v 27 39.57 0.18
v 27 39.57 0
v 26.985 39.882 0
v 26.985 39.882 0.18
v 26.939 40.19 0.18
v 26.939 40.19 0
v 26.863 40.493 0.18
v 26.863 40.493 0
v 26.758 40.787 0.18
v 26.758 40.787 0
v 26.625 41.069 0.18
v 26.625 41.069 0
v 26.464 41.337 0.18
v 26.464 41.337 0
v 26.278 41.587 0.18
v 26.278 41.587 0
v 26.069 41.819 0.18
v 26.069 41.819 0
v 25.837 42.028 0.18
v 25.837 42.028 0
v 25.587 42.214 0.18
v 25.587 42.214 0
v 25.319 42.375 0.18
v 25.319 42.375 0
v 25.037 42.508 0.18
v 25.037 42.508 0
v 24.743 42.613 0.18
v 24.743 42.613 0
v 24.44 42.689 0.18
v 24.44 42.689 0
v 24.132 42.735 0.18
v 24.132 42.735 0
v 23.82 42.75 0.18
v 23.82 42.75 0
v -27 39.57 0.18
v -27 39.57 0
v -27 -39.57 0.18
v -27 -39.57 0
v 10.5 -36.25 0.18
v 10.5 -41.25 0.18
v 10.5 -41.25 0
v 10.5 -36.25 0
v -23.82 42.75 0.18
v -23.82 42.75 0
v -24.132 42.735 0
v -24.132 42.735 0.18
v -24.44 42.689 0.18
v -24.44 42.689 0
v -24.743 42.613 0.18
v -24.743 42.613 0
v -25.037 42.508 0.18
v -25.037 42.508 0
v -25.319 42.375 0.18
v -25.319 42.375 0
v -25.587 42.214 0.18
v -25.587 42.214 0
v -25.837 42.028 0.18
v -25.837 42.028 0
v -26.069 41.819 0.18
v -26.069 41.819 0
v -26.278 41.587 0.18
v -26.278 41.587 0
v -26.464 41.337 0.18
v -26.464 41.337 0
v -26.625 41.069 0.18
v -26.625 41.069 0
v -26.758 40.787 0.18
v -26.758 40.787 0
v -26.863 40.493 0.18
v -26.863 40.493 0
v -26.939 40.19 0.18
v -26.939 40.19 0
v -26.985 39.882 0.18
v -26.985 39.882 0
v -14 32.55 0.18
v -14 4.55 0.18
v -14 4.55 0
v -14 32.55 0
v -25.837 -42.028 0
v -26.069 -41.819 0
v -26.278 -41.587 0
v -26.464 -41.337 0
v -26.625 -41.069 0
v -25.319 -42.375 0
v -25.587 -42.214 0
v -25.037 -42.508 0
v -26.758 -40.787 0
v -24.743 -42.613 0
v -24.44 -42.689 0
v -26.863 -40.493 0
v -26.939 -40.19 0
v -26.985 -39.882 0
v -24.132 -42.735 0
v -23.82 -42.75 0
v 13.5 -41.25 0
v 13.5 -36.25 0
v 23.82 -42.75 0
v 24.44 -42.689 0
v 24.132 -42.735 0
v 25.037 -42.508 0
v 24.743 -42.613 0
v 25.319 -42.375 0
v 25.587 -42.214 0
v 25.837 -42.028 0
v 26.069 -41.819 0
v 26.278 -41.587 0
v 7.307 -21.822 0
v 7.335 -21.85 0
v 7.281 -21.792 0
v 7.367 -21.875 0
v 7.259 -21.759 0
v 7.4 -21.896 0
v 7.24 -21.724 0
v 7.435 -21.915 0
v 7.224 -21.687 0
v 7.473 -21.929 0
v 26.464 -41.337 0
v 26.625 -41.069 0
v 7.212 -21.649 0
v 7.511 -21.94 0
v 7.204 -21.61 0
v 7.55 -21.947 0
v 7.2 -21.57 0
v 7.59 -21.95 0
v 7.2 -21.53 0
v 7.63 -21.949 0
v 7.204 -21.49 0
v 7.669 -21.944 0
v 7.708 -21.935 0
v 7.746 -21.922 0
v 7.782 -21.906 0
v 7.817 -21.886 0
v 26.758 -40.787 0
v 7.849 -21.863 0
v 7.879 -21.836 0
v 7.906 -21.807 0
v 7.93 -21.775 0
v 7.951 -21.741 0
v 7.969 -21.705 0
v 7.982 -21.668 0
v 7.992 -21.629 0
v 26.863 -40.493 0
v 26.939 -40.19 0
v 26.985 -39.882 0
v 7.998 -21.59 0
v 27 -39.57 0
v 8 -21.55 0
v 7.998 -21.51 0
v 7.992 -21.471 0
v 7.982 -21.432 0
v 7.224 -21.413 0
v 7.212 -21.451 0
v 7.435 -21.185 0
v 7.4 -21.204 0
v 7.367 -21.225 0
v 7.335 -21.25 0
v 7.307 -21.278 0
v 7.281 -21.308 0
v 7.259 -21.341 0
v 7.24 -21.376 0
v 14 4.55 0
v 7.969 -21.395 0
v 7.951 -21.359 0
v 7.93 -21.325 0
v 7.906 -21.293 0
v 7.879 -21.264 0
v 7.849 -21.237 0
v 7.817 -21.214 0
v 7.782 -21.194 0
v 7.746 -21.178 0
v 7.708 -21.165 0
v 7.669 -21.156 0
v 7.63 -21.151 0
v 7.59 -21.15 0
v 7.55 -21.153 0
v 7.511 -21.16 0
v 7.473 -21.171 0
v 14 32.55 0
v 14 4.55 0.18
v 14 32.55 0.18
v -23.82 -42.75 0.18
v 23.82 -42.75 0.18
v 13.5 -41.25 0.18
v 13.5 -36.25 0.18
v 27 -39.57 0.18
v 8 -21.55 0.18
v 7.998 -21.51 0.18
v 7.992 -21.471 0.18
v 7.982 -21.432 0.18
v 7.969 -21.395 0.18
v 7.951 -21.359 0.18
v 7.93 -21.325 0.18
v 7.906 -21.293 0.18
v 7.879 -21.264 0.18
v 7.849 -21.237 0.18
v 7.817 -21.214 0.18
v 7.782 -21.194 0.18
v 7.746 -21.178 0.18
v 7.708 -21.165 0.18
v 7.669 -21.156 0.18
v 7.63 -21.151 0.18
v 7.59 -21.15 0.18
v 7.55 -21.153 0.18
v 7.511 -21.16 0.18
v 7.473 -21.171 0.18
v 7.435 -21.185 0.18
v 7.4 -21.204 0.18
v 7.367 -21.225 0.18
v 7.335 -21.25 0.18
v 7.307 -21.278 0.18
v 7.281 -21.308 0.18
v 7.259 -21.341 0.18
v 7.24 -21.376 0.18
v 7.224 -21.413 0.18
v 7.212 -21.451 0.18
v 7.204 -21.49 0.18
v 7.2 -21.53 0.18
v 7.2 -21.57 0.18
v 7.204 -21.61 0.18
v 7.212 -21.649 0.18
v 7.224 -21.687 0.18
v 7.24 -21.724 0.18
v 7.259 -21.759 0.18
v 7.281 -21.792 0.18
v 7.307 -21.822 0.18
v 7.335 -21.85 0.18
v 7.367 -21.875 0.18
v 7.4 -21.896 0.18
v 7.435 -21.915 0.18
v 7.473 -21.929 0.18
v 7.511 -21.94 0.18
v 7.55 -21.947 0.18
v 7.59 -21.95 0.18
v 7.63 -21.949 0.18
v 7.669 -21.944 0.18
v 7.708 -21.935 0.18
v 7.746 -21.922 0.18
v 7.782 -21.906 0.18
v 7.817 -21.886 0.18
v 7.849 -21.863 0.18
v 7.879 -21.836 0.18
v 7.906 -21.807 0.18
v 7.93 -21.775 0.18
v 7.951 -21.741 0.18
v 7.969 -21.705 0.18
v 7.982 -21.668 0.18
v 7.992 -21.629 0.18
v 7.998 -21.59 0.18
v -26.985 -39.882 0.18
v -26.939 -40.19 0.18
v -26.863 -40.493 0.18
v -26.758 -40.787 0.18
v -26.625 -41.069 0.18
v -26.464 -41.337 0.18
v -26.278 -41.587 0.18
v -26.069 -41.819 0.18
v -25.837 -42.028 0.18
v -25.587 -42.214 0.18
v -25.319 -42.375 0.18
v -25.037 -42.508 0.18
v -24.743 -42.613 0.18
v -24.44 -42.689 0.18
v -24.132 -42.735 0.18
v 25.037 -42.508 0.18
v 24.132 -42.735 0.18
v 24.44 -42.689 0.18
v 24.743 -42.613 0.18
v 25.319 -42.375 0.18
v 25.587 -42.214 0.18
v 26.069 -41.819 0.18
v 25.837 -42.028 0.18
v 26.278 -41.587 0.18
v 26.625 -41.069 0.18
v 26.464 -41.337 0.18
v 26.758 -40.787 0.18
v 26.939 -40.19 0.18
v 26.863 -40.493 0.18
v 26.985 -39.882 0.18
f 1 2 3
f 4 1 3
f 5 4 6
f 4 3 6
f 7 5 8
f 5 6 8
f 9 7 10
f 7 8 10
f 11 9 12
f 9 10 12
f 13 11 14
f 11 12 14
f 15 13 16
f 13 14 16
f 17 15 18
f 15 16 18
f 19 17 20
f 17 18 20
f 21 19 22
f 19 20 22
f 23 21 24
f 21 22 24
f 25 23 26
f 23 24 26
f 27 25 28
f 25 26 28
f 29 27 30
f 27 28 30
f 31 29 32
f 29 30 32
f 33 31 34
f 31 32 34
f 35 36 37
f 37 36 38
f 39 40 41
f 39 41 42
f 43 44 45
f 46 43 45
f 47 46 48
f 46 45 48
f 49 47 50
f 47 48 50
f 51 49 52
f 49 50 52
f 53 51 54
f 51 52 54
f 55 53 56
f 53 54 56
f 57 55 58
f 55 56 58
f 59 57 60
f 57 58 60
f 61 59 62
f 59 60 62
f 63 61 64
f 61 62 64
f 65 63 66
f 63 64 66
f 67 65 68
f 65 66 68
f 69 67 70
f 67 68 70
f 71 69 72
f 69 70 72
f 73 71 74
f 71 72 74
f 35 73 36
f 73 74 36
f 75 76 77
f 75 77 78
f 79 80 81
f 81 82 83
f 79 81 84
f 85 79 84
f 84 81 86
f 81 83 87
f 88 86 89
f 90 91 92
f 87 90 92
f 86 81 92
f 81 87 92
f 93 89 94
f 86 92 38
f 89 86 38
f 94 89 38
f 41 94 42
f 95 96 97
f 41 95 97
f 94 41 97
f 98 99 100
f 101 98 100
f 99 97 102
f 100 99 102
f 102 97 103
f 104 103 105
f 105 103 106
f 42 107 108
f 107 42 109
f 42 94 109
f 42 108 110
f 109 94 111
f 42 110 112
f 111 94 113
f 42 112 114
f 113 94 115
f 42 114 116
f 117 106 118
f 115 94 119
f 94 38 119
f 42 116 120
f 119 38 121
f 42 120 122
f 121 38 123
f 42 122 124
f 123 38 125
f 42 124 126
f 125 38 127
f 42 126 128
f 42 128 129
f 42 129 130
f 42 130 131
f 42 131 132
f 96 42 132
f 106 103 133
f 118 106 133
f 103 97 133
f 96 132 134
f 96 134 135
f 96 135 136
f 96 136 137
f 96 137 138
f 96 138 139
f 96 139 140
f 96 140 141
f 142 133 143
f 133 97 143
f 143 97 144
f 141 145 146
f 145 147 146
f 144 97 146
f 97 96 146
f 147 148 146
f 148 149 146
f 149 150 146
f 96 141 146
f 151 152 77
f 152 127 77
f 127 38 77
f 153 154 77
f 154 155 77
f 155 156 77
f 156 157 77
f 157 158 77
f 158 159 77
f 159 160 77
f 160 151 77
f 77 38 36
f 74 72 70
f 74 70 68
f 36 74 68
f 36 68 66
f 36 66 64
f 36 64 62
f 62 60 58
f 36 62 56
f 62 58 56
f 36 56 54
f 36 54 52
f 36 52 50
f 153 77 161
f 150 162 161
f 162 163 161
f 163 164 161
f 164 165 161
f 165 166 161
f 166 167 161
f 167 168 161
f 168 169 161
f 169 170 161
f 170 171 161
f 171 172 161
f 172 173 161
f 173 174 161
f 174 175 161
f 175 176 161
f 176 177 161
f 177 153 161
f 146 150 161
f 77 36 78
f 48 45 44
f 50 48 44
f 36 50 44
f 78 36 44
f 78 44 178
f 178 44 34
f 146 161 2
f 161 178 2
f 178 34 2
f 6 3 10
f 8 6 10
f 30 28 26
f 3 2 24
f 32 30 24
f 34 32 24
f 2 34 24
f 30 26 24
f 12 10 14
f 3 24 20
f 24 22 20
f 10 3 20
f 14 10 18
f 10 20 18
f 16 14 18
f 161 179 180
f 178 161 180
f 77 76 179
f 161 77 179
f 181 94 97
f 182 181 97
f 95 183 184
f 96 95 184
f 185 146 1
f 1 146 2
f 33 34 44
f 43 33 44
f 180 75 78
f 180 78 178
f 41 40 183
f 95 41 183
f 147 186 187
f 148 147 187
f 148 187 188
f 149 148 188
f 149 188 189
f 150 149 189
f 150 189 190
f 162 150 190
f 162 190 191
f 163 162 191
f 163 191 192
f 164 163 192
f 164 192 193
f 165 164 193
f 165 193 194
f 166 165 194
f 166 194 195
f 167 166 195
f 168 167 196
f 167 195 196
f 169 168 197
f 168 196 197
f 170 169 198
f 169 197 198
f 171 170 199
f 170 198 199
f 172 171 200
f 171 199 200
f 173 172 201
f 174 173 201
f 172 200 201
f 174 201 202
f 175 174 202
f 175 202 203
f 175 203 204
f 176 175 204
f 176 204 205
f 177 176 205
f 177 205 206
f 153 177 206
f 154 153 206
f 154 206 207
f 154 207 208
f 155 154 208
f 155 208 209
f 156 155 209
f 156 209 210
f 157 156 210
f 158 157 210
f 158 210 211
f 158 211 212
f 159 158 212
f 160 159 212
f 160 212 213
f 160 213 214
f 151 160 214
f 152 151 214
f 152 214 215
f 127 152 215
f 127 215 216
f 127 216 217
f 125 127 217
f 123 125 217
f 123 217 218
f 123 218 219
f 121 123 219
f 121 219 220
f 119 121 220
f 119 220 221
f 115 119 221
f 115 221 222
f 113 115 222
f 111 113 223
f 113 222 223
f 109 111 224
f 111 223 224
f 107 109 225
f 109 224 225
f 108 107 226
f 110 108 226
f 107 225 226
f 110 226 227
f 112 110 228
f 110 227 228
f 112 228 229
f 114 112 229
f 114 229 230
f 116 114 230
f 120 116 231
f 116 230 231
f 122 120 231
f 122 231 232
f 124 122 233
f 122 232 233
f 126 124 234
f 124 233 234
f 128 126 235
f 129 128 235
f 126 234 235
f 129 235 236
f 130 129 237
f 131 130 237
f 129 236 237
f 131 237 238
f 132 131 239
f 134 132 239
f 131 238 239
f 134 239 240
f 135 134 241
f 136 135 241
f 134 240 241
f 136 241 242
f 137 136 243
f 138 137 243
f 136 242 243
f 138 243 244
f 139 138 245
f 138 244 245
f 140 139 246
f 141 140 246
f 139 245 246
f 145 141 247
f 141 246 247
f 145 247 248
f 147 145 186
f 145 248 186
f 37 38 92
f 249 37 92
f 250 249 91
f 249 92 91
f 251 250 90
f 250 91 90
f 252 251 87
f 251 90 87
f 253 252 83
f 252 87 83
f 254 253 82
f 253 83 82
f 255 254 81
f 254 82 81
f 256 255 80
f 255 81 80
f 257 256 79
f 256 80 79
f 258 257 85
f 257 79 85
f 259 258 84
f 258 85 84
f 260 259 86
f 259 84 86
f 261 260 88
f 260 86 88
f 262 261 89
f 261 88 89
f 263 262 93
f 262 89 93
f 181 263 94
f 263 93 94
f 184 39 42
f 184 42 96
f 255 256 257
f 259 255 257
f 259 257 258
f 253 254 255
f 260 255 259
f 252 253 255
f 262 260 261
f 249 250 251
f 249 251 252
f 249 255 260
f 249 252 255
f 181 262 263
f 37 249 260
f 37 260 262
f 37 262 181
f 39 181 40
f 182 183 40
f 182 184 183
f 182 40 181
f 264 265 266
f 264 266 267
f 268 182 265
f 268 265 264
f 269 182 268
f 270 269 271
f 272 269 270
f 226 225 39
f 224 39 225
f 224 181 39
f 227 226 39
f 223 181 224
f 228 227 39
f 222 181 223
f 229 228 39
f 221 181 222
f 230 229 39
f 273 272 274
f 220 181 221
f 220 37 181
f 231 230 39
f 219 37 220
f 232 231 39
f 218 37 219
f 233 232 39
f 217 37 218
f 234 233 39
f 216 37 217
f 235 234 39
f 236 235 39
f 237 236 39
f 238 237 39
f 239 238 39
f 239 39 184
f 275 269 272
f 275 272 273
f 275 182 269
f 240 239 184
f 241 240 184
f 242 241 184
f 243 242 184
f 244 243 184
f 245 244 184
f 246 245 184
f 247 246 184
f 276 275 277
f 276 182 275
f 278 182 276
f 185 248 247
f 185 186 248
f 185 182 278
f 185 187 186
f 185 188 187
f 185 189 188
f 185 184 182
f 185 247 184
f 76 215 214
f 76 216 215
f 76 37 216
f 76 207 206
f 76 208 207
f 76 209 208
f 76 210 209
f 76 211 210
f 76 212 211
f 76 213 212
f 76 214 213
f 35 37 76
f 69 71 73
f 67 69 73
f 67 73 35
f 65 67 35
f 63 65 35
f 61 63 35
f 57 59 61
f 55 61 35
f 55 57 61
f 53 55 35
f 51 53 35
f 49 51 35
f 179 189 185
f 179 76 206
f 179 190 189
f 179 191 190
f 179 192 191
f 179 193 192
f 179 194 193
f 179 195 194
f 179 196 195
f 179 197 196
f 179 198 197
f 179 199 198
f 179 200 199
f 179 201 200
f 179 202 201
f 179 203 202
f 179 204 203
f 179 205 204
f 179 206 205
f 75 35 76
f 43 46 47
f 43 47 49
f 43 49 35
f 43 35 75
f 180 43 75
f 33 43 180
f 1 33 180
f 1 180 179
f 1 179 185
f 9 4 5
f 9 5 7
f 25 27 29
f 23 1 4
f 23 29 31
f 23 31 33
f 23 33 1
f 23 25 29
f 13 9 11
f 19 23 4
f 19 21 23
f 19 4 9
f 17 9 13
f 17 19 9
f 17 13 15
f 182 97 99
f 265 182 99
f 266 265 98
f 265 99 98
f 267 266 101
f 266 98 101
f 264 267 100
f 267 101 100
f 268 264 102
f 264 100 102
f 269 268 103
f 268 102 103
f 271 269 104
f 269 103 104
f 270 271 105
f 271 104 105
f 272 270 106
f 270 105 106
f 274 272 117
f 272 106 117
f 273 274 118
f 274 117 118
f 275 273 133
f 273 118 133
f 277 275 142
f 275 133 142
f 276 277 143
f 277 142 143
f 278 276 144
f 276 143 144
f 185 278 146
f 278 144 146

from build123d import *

# Parameters (mm, degrees)
EXTRUDE_1_DEPTH     = 0.18
CUT_EXTRUDE_1_REACH = 52.563
SKETCH_2_R          = 0.4
SKETCH_2_W          = 3
SKETCH_2_H          = 5
SKETCH_3_W          = 28
SKETCH_3_H          = 28
CUT_EXTRUDE_2_DEPTH = 0.18


with BuildPart() as part:
    # 草图1 → 凸台-拉伸1 (new body)
    with BuildSketch(Plane.XY):
        with BuildLine():
            Line((-23.82, -42.75), (23.82, -42.75))
            ThreePointArc((23.82, -42.75), (26.068599564, -41.818599564), (27, -39.57))
            Line((27, -39.57), (27, 39.57))
            ThreePointArc((27, 39.57), (26.068599564, 41.818599564), (23.82, 42.75))
            Line((23.82, 42.75), (-23.82, 42.75))
            ThreePointArc((-23.82, 42.75), (-26.068599564, 41.818599564), (-27, 39.57))
            Line((-27, 39.57), (-27, -39.57))
            ThreePointArc((-27, -39.57), (-26.068599564, -41.818599564), (-23.82, -42.75))
        make_face()
    extrude(amount=EXTRUDE_1_DEPTH)

    # 草图2 → 切除-拉伸1 (cut, up to next)
    with BuildSketch(Plane.XY.offset(0.18), mode=Mode.PRIVATE) as cut_extrude_1_sk1:
        with Locations((7.6, -21.55)):
            Circle(SKETCH_2_R)
    cut_extrude_1_tool1 = extrude(cut_extrude_1_sk1.sketch, amount=-CUT_EXTRUDE_1_REACH, mode=Mode.PRIVATE) & part.part
    # 草图2 → 切除-拉伸1 (cut, up to next)
    with BuildSketch(Plane.XY.offset(0.18), mode=Mode.PRIVATE) as cut_extrude_1_sk2:
        with Locations((12, -38.75)):
            Rectangle(SKETCH_2_W, SKETCH_2_H)
    cut_extrude_1_tool2 = extrude(cut_extrude_1_sk2.sketch, amount=-CUT_EXTRUDE_1_REACH, mode=Mode.PRIVATE) & part.part
    add(cut_extrude_1_tool1.solids().sort_by_distance((7.6, -21.55, 0.18))[0], mode=Mode.SUBTRACT)
    add(cut_extrude_1_tool2.solids().sort_by_distance((12, -38.75, 0.18))[0], mode=Mode.SUBTRACT)

    # 草图3 → 切除-拉伸2 (cut)
    with BuildSketch(Plane.XY.offset(0.18)):
        with Locations((0, 18.55)):
            Rectangle(SKETCH_3_W, SKETCH_3_H)
    extrude(amount=-CUT_EXTRUDE_2_DEPTH, mode=Mode.SUBTRACT)


solid = part.part
